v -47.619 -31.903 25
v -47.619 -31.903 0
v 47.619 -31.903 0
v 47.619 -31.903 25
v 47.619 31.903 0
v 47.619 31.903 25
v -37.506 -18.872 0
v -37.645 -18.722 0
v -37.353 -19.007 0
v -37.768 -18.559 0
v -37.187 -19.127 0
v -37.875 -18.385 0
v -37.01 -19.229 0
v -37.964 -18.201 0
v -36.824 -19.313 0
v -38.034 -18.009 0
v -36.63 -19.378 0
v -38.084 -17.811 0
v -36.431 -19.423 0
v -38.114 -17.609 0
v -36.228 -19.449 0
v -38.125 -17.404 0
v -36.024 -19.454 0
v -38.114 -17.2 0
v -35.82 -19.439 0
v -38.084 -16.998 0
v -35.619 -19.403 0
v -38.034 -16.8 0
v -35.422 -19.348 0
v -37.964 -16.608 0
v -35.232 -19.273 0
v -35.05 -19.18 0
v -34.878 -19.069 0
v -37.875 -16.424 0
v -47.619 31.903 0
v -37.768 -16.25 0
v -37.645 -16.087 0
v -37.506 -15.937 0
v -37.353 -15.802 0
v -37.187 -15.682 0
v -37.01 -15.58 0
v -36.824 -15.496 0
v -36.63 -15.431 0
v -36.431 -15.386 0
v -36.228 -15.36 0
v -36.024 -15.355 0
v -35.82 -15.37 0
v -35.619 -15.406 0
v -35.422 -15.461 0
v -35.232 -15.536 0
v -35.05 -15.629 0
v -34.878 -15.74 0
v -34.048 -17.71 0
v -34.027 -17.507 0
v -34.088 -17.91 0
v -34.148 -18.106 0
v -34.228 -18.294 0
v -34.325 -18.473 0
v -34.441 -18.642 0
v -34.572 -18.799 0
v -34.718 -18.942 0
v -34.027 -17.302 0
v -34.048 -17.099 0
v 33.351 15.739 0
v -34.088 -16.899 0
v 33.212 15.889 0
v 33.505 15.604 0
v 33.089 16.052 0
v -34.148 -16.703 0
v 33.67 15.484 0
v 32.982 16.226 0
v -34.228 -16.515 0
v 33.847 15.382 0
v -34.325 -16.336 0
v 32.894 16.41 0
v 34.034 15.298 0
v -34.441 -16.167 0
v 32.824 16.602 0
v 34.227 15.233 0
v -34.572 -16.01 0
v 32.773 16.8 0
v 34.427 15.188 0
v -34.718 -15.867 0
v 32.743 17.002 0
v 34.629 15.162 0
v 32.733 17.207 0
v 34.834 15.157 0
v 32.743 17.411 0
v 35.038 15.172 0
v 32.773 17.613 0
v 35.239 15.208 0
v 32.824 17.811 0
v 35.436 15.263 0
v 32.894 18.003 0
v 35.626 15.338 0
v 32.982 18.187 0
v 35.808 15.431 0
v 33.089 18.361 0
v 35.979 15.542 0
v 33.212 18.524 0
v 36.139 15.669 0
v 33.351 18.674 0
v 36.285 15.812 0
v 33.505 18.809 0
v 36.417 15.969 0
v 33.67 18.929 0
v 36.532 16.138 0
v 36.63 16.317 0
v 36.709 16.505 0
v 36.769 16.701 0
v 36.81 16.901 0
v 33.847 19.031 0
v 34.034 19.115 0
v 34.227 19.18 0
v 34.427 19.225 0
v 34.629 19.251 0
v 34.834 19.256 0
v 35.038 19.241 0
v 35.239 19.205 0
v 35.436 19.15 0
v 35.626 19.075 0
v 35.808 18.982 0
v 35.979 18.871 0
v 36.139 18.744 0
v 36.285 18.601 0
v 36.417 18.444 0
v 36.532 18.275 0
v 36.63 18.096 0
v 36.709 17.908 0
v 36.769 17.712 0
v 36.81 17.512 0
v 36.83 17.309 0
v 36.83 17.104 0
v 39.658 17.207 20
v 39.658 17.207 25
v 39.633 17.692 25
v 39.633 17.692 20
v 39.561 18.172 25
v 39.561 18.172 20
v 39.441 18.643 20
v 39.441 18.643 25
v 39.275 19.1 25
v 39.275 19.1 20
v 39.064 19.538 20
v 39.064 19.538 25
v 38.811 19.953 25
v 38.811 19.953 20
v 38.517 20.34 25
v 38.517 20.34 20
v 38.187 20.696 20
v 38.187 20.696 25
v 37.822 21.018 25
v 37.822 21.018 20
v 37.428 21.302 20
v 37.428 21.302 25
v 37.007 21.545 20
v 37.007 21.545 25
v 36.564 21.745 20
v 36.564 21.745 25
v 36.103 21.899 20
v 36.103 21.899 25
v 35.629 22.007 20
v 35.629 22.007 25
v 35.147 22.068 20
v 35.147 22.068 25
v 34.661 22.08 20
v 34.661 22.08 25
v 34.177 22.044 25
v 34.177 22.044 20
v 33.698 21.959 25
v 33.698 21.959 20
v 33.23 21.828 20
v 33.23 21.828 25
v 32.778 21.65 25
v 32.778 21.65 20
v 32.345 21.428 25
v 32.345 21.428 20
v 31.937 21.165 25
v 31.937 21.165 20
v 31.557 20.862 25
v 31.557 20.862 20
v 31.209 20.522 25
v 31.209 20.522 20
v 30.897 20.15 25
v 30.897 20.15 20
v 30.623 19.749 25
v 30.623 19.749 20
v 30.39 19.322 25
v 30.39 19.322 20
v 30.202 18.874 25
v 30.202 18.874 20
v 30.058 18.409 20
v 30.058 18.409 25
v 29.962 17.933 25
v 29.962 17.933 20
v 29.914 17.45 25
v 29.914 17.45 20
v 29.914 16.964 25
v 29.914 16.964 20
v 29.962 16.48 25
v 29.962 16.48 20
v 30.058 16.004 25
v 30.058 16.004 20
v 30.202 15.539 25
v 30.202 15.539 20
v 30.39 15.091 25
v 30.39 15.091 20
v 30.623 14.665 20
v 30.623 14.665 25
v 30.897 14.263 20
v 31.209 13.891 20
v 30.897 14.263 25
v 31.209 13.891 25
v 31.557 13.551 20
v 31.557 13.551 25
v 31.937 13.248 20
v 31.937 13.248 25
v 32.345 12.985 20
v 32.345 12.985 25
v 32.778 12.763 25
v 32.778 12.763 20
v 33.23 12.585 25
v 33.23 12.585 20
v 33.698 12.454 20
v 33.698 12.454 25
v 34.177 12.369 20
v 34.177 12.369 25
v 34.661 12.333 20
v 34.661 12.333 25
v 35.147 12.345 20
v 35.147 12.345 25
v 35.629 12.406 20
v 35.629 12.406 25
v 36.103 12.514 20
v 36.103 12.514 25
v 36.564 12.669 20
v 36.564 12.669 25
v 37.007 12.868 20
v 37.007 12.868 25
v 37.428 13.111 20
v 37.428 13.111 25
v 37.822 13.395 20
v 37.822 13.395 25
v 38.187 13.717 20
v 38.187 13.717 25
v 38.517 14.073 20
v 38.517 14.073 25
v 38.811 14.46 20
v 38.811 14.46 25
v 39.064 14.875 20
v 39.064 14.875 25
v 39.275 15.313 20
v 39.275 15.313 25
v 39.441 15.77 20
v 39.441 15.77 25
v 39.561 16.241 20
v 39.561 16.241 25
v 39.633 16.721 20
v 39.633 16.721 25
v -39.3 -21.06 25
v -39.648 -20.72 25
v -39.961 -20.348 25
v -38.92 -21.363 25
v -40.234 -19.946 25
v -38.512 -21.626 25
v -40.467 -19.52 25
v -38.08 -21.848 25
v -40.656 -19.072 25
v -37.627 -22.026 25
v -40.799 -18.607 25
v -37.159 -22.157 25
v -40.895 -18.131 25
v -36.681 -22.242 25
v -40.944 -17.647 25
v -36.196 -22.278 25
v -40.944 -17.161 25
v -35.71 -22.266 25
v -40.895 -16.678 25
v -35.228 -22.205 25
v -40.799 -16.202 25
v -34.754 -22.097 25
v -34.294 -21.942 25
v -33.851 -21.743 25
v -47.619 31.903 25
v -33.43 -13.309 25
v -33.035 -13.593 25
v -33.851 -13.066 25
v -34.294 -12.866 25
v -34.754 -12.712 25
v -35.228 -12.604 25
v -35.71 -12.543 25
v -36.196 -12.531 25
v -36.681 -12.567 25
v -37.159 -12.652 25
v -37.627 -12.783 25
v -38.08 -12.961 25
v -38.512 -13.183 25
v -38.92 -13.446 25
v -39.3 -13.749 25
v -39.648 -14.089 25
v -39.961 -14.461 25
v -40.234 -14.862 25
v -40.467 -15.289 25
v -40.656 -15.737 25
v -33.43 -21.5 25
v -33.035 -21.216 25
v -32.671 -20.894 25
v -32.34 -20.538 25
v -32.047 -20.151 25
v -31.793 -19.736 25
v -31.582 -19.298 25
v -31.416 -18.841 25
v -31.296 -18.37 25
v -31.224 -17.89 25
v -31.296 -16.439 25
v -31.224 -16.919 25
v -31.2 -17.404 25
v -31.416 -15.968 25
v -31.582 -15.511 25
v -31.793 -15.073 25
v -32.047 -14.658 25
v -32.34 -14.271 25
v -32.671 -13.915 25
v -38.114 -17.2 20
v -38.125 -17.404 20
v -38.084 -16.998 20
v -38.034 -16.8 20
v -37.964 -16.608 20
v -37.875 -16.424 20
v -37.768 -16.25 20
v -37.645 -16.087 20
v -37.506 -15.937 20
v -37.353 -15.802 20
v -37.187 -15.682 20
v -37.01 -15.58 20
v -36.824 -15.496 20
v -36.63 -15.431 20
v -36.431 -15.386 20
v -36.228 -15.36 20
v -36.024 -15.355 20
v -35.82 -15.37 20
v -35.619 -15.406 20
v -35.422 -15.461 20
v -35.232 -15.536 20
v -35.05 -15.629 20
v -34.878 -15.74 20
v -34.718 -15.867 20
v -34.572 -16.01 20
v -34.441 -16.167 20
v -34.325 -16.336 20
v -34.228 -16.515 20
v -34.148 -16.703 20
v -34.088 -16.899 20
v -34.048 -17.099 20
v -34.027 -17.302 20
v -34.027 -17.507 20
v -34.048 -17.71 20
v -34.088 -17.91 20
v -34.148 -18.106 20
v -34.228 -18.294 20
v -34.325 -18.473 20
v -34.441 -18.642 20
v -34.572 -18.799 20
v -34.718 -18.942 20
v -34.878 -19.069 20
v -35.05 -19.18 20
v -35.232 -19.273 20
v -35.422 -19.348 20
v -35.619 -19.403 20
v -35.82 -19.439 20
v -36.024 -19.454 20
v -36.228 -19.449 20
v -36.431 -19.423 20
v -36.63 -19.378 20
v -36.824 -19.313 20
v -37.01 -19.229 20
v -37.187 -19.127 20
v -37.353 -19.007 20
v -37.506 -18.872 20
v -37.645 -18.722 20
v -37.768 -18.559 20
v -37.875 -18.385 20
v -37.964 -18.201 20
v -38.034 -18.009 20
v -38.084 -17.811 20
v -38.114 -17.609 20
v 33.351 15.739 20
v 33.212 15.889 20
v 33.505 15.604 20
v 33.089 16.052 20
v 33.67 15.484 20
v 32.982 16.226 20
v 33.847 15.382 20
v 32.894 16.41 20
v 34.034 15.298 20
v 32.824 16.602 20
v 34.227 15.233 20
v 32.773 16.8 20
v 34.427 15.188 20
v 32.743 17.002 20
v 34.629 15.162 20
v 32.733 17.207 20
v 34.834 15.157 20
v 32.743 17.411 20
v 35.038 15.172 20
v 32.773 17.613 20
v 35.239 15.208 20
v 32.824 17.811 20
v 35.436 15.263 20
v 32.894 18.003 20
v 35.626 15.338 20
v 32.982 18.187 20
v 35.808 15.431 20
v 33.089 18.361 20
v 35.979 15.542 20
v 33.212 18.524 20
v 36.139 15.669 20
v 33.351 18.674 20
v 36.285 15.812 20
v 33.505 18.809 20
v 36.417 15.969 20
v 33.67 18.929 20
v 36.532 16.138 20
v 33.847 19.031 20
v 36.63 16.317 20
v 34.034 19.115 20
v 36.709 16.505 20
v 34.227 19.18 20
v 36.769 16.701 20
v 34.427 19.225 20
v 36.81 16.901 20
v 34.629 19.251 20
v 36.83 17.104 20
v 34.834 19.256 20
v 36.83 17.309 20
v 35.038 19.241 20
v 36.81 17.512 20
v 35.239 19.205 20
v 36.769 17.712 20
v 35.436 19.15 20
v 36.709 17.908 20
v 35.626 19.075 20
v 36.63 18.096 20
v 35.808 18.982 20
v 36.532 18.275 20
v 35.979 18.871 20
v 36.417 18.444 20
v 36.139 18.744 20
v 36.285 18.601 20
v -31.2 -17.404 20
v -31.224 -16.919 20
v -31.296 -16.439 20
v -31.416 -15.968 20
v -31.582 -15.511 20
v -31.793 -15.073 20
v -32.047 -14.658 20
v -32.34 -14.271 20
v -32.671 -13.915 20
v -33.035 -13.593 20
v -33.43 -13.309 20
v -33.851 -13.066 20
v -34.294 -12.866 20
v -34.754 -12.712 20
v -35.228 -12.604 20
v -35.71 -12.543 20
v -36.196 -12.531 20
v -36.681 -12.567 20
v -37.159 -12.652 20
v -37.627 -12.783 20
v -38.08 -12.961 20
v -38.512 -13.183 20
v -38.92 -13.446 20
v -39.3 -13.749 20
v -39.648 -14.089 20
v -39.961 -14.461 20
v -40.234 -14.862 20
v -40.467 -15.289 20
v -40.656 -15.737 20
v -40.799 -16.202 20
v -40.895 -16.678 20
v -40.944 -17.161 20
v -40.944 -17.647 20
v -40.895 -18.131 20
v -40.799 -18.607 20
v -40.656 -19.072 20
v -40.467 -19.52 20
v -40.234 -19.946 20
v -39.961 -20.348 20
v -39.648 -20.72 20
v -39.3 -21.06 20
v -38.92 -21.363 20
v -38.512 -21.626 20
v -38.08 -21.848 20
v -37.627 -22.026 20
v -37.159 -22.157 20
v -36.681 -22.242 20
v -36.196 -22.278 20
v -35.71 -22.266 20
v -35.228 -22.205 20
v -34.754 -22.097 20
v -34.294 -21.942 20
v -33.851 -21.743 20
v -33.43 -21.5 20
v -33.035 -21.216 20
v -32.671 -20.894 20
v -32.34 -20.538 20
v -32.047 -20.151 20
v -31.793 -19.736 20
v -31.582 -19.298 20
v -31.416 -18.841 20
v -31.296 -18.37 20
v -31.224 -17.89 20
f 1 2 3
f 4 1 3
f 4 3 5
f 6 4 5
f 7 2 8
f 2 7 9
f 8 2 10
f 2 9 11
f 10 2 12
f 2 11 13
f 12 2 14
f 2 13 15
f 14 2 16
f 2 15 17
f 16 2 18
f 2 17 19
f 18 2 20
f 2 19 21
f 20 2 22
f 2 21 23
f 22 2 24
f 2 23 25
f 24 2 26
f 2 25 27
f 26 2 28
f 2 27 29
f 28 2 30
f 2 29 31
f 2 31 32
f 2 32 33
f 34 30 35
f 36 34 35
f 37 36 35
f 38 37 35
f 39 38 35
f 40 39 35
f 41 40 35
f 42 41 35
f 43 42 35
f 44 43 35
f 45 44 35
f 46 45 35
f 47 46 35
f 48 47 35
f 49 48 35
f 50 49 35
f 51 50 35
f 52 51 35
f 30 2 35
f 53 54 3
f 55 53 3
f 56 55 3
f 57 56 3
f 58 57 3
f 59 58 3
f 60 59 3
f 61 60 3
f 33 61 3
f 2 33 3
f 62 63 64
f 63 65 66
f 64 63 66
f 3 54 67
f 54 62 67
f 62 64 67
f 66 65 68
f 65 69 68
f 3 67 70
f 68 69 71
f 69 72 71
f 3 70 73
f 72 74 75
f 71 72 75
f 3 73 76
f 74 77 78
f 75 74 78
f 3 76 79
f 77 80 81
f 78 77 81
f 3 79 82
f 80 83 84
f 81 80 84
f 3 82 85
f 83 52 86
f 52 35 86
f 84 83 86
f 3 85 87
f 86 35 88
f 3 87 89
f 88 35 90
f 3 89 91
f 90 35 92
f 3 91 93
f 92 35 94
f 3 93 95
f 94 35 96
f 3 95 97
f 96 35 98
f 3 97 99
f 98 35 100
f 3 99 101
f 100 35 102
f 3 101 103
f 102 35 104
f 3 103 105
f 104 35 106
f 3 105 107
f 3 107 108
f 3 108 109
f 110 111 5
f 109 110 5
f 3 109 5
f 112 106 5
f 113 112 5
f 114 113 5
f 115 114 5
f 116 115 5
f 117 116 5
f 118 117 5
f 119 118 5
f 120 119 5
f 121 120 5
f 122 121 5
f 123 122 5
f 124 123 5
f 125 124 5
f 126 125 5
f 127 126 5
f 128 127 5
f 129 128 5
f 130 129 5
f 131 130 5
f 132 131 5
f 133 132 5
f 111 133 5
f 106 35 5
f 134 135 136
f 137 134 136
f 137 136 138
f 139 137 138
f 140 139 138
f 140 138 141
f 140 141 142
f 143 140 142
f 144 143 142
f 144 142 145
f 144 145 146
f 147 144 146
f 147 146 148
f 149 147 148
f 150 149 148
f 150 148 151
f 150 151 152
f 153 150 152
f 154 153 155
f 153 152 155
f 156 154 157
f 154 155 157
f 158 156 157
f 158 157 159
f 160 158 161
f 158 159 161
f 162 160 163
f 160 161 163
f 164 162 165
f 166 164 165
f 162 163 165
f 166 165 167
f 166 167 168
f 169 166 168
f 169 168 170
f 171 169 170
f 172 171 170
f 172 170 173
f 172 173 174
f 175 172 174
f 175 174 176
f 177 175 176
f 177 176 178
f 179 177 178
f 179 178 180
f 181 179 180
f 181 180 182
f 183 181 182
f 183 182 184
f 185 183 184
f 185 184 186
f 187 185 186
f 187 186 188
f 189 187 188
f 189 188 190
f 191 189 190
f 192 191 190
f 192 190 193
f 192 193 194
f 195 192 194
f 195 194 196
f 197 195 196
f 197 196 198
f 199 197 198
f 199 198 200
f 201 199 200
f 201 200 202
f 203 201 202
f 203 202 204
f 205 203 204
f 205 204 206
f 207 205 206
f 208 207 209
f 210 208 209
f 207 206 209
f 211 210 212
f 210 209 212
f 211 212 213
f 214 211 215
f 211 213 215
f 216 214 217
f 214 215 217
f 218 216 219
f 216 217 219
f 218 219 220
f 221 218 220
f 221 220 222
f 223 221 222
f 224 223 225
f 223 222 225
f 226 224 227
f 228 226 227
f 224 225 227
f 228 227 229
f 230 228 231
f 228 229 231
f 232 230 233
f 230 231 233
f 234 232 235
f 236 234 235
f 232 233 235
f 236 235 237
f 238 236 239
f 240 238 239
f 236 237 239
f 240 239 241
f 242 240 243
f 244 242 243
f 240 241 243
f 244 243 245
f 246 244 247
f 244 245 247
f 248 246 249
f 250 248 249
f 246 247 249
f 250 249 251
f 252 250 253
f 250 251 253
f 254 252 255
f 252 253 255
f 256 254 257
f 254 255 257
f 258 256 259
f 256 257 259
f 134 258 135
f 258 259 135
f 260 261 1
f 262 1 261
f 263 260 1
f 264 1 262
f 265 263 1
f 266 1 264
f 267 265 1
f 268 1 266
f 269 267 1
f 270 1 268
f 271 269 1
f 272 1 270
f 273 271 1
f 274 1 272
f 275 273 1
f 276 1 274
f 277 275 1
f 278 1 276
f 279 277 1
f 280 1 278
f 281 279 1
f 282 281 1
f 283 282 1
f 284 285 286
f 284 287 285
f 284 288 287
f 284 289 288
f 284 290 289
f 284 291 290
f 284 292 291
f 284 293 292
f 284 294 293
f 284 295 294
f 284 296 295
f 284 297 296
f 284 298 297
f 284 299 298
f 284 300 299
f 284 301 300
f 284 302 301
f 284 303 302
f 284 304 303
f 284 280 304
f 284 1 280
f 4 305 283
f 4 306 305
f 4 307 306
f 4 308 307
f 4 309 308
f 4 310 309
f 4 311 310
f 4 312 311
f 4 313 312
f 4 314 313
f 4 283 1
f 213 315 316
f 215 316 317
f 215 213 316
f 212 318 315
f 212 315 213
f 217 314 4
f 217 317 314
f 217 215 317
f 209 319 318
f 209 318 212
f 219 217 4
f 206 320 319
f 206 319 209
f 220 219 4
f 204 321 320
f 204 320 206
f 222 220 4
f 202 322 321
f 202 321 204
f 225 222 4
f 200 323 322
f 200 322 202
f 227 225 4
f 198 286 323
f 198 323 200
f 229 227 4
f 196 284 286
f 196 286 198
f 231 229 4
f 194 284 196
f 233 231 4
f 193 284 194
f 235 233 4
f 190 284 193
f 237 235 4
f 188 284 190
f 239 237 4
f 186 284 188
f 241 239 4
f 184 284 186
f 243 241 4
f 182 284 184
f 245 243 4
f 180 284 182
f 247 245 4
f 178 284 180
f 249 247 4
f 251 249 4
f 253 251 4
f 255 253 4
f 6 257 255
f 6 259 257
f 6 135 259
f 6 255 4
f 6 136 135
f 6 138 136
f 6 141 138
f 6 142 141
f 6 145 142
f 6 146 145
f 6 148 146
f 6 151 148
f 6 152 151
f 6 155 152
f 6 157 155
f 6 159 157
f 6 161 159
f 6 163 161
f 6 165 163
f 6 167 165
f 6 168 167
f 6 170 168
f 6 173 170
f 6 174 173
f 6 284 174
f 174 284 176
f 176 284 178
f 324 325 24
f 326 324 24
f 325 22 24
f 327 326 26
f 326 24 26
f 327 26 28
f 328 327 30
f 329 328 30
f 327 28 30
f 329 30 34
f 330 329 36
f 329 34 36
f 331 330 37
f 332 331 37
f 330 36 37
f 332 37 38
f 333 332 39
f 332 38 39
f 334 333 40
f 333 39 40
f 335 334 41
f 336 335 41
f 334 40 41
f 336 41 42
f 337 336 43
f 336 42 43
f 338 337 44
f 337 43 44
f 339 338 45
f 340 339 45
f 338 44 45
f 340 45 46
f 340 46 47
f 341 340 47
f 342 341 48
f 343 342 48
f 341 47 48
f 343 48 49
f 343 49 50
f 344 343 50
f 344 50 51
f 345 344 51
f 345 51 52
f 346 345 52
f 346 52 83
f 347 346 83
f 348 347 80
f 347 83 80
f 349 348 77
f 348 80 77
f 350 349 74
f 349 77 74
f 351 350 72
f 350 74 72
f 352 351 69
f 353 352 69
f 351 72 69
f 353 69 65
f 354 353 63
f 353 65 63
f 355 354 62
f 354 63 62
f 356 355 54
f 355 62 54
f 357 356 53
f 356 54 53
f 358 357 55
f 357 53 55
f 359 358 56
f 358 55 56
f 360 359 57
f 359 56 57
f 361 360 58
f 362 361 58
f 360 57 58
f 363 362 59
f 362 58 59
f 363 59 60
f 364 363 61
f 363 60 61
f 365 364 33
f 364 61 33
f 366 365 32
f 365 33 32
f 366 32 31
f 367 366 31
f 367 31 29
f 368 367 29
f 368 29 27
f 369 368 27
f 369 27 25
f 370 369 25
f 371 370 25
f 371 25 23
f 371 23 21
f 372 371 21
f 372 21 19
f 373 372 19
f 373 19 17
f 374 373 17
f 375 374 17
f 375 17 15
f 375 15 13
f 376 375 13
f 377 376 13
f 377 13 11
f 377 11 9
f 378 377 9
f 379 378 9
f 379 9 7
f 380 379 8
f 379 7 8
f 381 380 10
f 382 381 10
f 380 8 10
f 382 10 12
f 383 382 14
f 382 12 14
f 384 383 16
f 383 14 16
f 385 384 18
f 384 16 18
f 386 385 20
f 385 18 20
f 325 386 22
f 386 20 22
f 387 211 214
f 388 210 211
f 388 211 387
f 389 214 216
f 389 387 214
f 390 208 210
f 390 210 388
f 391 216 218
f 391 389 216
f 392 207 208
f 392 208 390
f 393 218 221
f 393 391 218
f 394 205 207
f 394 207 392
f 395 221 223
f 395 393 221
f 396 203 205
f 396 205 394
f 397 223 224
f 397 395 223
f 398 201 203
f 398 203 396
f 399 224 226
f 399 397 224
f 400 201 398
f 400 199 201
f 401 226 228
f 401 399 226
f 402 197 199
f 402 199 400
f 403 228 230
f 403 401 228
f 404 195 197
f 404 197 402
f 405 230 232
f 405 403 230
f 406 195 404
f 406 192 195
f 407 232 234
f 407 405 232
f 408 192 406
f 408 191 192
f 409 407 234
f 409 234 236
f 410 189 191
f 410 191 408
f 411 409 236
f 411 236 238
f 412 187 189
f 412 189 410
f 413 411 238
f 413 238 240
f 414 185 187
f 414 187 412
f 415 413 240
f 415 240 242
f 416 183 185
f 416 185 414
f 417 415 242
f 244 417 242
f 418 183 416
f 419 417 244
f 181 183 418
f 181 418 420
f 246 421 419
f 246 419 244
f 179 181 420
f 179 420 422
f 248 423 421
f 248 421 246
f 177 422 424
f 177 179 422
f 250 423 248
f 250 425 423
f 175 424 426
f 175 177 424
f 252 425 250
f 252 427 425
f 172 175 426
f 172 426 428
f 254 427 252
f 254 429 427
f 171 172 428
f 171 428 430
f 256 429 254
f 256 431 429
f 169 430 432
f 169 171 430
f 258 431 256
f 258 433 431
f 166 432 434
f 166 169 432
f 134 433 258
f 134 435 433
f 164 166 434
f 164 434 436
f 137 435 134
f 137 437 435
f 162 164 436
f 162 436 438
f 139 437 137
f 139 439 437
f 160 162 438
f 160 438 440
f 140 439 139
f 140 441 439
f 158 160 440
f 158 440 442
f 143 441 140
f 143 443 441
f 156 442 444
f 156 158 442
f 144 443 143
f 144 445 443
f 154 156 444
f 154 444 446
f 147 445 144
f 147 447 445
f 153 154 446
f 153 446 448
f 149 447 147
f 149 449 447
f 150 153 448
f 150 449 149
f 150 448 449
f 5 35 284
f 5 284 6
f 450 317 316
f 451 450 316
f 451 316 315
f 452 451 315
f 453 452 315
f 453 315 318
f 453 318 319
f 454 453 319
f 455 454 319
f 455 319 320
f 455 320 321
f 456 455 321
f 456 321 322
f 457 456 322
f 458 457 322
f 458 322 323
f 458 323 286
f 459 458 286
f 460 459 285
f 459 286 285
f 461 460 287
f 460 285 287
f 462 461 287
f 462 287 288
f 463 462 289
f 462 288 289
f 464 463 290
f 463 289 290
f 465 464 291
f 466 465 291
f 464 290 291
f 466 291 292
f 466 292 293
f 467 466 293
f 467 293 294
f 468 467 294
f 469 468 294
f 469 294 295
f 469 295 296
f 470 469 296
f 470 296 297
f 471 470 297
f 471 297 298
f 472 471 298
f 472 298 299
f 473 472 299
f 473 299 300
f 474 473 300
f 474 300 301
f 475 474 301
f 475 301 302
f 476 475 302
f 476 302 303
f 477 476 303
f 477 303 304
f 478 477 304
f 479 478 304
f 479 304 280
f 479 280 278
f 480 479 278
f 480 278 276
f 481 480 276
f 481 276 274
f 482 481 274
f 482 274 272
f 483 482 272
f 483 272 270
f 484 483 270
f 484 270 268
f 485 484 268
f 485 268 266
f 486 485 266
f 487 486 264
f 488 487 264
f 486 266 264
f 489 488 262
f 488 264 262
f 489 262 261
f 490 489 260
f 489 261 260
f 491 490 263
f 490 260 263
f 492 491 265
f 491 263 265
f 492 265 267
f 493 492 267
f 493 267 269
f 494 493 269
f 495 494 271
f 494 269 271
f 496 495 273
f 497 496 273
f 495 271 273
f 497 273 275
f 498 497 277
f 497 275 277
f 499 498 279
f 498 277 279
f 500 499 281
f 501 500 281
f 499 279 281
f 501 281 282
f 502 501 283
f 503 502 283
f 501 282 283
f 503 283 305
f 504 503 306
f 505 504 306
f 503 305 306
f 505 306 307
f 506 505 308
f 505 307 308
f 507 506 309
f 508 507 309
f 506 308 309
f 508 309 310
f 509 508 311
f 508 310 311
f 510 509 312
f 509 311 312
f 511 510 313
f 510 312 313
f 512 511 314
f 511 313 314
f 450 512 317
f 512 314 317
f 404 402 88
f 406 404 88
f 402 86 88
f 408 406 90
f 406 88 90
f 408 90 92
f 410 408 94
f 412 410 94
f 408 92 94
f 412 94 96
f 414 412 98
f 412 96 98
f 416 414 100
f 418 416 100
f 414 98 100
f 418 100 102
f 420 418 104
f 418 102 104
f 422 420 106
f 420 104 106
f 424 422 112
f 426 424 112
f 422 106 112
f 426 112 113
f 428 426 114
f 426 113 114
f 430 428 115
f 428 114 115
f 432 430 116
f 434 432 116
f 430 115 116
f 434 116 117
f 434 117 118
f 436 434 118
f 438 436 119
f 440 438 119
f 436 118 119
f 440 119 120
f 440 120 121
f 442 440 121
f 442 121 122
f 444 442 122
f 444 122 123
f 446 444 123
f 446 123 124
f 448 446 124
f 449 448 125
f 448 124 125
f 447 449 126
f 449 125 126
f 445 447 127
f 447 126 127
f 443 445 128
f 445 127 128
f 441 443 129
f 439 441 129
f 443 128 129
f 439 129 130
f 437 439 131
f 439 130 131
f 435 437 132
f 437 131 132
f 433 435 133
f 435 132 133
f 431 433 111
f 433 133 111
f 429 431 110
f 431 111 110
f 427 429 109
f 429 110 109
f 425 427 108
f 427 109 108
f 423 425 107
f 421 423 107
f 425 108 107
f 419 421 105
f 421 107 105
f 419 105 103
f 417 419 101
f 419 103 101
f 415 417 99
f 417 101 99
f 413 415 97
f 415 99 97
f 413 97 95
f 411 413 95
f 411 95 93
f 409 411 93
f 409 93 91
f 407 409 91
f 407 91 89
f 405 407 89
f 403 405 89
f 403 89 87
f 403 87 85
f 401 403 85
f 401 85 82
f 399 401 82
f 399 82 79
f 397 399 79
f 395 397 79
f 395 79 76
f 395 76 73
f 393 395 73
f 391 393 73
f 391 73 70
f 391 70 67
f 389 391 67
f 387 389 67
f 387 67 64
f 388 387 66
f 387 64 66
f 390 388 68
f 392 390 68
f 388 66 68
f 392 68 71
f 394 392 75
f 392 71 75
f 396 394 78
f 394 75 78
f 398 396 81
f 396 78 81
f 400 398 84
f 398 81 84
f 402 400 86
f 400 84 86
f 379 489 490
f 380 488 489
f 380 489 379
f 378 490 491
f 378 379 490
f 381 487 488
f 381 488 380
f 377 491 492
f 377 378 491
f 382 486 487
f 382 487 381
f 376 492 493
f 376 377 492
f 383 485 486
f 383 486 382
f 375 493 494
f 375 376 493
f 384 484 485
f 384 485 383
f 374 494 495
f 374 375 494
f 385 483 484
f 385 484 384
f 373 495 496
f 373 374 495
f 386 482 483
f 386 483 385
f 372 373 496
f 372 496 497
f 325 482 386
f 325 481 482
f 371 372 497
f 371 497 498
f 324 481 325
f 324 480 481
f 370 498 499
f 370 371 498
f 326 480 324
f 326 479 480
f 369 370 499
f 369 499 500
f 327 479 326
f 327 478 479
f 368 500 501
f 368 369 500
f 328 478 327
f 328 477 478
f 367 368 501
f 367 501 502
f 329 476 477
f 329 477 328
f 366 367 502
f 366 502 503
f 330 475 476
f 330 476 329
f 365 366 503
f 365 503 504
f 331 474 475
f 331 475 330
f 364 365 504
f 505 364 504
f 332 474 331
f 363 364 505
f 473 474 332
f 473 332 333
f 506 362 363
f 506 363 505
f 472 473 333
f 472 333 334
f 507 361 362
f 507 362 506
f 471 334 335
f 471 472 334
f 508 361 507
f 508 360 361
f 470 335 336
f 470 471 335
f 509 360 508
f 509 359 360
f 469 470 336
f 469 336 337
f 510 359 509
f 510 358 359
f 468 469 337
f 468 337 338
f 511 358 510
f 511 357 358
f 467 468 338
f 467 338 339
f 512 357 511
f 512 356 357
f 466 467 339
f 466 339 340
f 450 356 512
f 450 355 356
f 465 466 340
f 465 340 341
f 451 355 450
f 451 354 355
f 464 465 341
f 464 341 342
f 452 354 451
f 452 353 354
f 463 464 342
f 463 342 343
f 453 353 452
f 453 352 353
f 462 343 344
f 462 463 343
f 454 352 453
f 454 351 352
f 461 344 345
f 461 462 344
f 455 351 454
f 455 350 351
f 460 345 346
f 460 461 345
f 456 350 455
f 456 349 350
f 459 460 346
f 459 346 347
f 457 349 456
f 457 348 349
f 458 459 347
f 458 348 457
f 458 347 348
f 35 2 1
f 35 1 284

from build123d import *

# Parameters (mm, degrees)
F0_W           = 95.2388942242
F0_H           = 63.8058483601
F1_DEPTH       = 25
F3_D           = 4.1
F3_CBORE_D     = 9.75
F3_CBORE_DEPTH = 5
F5_D           = 4.1
F5_CBORE_D     = 9.75
F5_CBORE_DEPTH = 5


with BuildPart() as f1:
    # F0 (on Top) → F1 (new body)
    with BuildSketch(Plane.XY):
        Rectangle(F0_W, F0_H)
    extrude(amount=F1_DEPTH)

    # F3 (through all)
    with Locations(Plane.XY.offset(25)):
        with Locations((-36.0746867955, -17.4044892192)):
            CounterBoreHole(F3_D / 2, F3_CBORE_D / 2, F3_CBORE_DEPTH)

    # F5 (through all)
    with Locations(Plane.XY.offset(25)):
        with Locations((34.78269279, 17.2065105289)):
            CounterBoreHole(F5_D / 2, F5_CBORE_D / 2, F5_CBORE_DEPTH)


solid = f1.part
